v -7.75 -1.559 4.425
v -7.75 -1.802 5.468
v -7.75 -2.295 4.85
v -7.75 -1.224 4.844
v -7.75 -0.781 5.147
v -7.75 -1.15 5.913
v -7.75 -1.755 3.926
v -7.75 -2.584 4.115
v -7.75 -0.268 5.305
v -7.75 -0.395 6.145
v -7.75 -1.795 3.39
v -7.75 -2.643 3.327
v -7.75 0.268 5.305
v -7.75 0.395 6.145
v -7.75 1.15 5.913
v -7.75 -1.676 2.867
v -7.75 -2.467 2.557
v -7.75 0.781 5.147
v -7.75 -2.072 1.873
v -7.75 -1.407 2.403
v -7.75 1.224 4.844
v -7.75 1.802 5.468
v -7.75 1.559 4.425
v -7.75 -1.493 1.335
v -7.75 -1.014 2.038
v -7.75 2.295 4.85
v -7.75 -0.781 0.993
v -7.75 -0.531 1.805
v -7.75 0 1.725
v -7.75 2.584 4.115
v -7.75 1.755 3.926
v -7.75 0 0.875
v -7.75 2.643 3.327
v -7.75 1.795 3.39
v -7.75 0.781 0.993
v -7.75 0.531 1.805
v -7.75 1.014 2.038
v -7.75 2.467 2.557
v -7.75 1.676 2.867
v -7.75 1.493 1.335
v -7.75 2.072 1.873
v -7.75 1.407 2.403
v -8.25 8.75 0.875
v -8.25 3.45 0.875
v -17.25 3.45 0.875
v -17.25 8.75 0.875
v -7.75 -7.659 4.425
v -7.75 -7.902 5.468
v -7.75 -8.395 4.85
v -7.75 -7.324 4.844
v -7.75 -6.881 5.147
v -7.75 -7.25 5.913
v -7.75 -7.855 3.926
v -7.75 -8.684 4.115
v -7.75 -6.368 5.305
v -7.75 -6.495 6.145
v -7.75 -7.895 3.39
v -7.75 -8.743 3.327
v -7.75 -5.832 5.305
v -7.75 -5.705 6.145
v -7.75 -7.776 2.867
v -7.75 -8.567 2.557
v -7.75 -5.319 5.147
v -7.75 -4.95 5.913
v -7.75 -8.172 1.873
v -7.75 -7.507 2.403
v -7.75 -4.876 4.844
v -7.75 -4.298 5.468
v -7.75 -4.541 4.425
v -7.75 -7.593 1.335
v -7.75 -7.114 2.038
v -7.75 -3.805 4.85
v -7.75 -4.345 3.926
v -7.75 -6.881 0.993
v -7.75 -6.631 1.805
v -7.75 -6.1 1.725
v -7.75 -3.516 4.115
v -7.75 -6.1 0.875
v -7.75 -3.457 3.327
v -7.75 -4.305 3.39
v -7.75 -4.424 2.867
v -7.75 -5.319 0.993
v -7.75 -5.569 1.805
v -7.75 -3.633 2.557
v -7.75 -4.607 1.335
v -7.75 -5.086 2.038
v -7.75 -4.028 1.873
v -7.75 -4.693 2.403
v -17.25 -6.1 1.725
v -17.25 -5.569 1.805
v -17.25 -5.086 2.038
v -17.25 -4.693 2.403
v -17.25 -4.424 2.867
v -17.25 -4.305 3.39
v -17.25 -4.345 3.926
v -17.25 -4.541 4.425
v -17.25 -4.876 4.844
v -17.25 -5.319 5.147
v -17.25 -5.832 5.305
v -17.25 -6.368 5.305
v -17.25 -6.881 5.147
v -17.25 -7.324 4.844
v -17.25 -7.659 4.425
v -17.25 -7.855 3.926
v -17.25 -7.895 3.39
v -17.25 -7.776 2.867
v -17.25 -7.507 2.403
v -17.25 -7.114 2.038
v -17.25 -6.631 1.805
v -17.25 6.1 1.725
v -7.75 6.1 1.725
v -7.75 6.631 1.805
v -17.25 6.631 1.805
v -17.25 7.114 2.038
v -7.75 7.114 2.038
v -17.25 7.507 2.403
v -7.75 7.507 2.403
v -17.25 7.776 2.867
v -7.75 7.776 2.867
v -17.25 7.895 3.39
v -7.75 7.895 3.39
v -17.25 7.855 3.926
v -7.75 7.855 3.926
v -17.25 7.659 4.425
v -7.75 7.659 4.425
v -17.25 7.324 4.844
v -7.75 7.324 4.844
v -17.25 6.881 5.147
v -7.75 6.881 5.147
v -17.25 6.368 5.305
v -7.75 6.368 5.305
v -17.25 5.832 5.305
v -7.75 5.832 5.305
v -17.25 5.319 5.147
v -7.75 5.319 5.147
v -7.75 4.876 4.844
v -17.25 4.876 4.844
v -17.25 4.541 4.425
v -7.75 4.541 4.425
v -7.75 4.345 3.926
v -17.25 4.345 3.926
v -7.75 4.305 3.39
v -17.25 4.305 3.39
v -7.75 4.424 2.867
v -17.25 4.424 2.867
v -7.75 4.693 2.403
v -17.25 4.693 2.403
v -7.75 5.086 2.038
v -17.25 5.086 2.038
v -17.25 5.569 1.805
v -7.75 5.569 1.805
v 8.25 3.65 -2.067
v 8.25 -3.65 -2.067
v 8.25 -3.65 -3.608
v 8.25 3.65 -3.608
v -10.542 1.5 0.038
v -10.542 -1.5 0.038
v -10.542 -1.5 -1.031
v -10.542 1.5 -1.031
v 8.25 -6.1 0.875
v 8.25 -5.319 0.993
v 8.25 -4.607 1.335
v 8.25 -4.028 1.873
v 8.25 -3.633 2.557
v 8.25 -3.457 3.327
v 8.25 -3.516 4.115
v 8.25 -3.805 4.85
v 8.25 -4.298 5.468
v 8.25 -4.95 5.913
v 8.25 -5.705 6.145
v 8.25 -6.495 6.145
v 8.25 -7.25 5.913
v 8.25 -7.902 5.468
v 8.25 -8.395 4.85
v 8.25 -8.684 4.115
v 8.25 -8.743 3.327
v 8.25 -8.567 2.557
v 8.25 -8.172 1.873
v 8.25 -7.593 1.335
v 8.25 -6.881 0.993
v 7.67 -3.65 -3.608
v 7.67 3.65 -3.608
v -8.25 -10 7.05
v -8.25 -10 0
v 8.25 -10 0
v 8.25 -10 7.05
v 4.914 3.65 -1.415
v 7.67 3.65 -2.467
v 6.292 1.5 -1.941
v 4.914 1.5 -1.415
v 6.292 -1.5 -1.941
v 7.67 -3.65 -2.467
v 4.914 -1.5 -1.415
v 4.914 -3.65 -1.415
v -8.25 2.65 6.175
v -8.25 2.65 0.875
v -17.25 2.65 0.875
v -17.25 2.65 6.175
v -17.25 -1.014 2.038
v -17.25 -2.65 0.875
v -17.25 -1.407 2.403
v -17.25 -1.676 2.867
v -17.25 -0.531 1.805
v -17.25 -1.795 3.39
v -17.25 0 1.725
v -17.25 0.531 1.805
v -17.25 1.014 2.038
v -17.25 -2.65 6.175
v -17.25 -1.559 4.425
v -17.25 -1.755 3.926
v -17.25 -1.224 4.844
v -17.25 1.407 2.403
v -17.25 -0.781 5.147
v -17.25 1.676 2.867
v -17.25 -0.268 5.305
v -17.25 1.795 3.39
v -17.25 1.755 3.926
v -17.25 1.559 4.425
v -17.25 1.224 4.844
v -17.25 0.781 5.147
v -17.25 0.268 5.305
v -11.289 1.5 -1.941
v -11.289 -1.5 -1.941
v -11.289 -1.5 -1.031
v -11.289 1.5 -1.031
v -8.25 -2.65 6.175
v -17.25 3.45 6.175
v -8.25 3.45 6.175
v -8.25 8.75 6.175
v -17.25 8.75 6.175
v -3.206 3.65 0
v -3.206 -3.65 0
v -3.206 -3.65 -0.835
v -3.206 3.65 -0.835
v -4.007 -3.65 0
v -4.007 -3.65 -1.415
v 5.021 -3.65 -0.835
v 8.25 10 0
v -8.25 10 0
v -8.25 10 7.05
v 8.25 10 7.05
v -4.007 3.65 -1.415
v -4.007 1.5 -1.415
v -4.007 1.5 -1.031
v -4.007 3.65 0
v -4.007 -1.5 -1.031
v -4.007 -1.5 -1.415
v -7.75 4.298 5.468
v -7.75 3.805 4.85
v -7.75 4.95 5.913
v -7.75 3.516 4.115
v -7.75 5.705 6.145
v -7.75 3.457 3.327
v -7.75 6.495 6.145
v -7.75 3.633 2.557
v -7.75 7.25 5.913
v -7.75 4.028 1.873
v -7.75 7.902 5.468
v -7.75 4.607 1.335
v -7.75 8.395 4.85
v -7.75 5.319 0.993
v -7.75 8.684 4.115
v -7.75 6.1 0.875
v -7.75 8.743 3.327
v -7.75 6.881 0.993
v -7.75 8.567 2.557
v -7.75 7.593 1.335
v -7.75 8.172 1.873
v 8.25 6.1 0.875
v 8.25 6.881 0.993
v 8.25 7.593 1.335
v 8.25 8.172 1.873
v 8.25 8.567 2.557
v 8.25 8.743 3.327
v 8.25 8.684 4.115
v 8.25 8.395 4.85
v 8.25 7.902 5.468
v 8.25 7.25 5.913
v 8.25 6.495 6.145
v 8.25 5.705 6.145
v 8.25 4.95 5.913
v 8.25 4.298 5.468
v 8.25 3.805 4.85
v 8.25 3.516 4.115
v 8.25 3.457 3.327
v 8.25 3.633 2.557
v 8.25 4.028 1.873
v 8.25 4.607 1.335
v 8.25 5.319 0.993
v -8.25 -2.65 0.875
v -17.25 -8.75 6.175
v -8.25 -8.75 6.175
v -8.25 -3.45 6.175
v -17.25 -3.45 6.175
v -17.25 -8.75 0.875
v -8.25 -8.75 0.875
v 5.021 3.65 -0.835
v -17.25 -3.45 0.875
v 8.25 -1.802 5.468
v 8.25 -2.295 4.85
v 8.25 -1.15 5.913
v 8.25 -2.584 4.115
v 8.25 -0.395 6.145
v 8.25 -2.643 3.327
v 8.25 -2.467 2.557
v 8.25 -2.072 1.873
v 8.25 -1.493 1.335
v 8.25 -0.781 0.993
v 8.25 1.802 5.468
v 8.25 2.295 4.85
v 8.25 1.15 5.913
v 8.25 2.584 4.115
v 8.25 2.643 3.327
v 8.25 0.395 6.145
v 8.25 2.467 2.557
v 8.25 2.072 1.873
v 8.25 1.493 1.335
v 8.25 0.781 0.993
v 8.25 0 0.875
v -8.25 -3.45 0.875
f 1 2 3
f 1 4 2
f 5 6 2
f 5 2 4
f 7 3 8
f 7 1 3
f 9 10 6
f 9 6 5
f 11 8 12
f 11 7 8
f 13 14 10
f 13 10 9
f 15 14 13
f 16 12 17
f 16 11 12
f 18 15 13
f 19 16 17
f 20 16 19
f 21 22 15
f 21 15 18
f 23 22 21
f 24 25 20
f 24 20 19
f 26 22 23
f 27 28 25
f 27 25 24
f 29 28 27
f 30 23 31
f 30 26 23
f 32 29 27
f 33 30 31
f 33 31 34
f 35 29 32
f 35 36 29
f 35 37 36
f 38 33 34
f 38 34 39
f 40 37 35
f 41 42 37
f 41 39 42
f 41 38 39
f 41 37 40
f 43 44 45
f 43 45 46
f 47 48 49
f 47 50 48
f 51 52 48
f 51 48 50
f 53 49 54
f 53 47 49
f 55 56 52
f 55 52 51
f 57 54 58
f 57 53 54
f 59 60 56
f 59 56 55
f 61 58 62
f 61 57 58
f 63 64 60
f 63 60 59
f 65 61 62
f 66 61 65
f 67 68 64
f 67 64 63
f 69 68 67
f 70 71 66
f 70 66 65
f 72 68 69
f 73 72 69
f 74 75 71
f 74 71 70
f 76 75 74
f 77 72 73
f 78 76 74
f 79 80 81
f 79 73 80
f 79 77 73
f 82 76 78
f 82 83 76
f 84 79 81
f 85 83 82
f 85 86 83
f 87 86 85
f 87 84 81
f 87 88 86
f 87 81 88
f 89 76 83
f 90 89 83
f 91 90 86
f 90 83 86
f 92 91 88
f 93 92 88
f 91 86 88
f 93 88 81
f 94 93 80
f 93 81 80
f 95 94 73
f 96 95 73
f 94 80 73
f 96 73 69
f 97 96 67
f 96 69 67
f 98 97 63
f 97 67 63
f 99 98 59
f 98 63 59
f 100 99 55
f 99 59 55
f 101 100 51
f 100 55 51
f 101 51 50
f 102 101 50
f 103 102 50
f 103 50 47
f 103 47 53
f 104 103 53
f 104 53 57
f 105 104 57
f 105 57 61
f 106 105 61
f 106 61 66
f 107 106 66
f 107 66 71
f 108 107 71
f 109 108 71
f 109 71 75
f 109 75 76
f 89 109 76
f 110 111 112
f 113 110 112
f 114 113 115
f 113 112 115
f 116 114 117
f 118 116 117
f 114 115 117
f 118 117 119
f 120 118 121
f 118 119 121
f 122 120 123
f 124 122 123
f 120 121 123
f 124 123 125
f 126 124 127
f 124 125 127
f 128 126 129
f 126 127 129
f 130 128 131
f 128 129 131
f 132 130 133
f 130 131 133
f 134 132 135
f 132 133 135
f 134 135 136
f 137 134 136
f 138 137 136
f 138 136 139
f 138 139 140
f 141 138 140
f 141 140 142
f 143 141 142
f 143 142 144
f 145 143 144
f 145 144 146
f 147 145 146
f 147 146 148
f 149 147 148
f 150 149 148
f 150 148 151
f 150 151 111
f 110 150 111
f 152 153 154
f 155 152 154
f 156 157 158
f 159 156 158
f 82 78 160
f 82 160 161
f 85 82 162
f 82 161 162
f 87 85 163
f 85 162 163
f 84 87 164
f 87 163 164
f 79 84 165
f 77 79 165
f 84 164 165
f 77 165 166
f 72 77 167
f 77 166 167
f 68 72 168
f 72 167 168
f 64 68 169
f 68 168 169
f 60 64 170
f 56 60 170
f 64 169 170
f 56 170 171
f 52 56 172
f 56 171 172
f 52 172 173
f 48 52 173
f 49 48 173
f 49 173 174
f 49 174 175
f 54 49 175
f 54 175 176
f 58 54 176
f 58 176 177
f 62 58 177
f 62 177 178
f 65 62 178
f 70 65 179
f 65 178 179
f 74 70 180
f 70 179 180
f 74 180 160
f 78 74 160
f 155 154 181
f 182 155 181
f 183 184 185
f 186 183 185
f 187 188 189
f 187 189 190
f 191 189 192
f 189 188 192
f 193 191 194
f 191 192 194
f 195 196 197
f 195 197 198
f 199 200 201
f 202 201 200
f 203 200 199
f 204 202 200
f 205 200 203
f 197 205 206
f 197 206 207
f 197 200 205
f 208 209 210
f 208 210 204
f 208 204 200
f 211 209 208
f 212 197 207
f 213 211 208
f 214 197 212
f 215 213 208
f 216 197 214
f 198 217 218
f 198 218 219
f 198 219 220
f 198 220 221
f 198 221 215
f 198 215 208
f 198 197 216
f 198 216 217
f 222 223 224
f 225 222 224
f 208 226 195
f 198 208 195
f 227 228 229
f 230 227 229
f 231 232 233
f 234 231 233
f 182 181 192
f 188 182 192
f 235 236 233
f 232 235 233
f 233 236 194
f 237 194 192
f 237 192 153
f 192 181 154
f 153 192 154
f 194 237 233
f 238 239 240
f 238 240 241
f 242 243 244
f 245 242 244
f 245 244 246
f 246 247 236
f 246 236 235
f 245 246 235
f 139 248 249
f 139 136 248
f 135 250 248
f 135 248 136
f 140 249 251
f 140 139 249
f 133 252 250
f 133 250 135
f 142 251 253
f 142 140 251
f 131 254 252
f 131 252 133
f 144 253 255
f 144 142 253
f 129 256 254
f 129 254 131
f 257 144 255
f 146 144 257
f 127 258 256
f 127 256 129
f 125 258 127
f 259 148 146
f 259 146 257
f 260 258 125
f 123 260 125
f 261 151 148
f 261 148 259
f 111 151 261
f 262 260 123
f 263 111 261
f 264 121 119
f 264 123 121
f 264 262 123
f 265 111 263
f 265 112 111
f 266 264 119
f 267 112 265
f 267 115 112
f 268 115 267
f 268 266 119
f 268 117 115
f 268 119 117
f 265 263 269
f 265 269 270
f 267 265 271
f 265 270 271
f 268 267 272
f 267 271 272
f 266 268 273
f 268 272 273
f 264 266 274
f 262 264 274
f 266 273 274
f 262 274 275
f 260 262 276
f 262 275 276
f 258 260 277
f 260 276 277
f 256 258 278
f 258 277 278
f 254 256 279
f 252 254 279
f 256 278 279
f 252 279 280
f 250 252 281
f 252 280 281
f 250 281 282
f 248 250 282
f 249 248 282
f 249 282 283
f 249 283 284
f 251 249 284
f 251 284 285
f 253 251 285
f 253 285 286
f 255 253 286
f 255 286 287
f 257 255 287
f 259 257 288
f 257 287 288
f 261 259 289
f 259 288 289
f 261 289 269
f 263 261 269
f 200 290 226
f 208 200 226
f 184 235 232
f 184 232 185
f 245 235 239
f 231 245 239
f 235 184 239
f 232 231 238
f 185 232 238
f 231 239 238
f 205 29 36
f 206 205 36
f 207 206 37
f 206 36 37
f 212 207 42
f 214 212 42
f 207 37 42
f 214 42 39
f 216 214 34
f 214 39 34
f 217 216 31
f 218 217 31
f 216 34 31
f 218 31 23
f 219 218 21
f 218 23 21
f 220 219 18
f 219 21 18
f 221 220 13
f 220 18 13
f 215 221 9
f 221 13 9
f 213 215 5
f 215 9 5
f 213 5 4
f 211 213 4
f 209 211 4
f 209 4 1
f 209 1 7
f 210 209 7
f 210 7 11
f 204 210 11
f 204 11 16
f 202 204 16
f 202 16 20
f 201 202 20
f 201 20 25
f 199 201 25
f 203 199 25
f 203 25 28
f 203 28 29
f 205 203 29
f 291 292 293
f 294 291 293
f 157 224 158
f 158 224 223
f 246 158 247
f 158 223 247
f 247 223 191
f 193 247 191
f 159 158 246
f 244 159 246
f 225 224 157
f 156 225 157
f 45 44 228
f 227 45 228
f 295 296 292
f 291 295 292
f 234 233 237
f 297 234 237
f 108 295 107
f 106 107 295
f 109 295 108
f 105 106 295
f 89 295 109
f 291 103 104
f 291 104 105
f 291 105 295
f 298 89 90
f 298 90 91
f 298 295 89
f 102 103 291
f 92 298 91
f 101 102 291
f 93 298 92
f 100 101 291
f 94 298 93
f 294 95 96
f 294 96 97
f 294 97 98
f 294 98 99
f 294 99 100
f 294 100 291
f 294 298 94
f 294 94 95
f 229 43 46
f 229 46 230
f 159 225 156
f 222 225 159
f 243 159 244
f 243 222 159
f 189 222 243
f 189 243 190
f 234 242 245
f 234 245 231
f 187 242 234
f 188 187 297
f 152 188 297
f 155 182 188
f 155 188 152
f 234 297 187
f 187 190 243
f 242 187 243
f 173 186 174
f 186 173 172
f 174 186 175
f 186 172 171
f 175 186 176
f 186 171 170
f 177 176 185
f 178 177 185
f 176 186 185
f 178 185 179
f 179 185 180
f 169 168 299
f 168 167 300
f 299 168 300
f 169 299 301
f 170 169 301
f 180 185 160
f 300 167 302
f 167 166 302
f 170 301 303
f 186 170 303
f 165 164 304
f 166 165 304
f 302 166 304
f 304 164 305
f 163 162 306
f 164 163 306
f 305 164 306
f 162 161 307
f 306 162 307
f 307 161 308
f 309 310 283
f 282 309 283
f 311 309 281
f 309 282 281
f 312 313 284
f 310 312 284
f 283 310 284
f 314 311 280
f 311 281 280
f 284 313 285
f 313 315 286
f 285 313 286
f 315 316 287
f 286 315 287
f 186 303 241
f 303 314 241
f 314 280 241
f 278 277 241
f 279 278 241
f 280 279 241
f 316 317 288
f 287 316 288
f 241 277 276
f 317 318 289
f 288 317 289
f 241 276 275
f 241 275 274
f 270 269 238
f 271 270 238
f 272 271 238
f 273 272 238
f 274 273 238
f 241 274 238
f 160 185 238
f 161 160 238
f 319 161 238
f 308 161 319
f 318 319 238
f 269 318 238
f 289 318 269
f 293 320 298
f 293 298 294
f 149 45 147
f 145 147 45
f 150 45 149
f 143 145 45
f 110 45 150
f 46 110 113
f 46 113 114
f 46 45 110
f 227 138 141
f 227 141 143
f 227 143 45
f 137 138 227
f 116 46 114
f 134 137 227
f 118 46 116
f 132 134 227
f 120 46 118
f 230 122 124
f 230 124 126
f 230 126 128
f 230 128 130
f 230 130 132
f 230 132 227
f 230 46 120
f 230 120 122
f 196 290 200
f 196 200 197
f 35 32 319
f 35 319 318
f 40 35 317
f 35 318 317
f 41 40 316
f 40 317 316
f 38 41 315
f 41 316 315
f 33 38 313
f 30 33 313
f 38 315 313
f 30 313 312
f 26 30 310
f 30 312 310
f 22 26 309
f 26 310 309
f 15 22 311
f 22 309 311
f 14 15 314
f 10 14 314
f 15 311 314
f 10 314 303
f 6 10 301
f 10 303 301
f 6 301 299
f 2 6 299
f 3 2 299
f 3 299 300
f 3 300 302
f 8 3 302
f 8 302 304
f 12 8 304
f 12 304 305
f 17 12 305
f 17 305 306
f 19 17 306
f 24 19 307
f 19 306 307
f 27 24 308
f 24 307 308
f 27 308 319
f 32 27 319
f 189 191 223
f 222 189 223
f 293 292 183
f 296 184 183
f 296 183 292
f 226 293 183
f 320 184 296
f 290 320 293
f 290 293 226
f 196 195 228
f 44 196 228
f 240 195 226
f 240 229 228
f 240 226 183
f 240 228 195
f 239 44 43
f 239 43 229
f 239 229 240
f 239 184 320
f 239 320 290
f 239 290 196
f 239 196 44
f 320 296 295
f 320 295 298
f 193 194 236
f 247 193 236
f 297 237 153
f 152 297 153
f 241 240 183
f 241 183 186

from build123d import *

# Parameters (mm, degrees)
SKETCH_1_W           = 16.5
SKETCH_1_H           = 20
EXTRUDE_1_DEPTH      = 7.05
SKETCH_2_W           = 5.3
SKETCH_2_H           = 5.3
EXTRUDE_2_DEPTH      = 9
SKETCH_3_R           = 1.8
CUT_EXTRUDE_1_DEPTH  = 26
SKETCH_4_R           = 2.65
CUT_EXTRUDE_4_DEPTH  = 16
EXTRUDE_3_DEPTH      = 3.65
EXTRUDE_3_DEPTH_BACK = 3.65
EXTRUDE_4_DEPTH      = 1.5
EXTRUDE_4_DEPTH_BACK = 1.5


with BuildPart() as part:
    # 草图1 → 凸台-拉伸1 (new body)
    with BuildSketch(Plane.XY):
        Rectangle(SKETCH_1_W, SKETCH_1_H)
    extrude(amount=EXTRUDE_1_DEPTH)

    # 草图2 → 凸台-拉伸2 (add)
    with BuildSketch(Plane.ZY.offset(8.25)):
        with Locations((3.525, 6.1)):
            Rectangle(SKETCH_2_W, SKETCH_2_H)
        with Locations((3.525, 0)):
            Rectangle(SKETCH_2_W, SKETCH_2_H)
        with Locations((3.525, -6.1)):
            Rectangle(SKETCH_2_W, SKETCH_2_H)
    extrude(amount=EXTRUDE_2_DEPTH)

    # 草图3 → 切除-拉伸1 (cut)
    with BuildSketch(Plane(origin=(8.25, 0, 0), x_dir=(0, 0, -1), z_dir=(1, 0, 0))):
        with Locations((-3.525, 0)):
            Circle(SKETCH_3_R)
        with Locations((-3.525, 6.1)):
            Circle(SKETCH_3_R)
        with Locations((-3.525, -6.1)):
            Circle(SKETCH_3_R)
    extrude(amount=-CUT_EXTRUDE_1_DEPTH, mode=Mode.SUBTRACT)

    # 草图4 → 切除-拉伸4 (cut)
    with BuildSketch(Plane(origin=(8.25, 0, 0), x_dir=(0, 0, -1), z_dir=(1, 0, 0))):
        with Locations((-3.525, 0)):
            Circle(SKETCH_4_R)
        with Locations((-3.525, 6.1)):
            Circle(SKETCH_4_R)
        with Locations((-3.525, -6.1)):
            Circle(SKETCH_4_R)
    extrude(amount=-CUT_EXTRUDE_4_DEPTH, mode=Mode.SUBTRACT)

    # 草图6 → 凸台-拉伸3 (add, two sides: drawn at the far end of the back side and taken through both)
    with BuildSketch(Plane(origin=(0, 0, 0), x_dir=(1, 0, 0), z_dir=(0, 1, 0)).offset(-EXTRUDE_3_DEPTH_BACK)):
        Polygon((-3.205949892, 0.834716435), (5.020511508, 0.834716435), (8.25, 2.067145109), (8.25, 3.607680952), (7.67, 3.607680952), (7.67, 3.027680952), (7.67, 2.466605373), (4.91360258, 1.414716435), (-3.205949892, 1.414716435), (-4.00702853, 1.414716435), (-4.00702853, 0), (-3.205949892, 0), align=None)
    extrude(amount=EXTRUDE_3_DEPTH + EXTRUDE_3_DEPTH_BACK)

    # 草图7 → 凸台-拉伸4 (add, two sides: drawn at the far end of the back side and taken through both)
    with BuildSketch(Plane(origin=(0, 0, 0), x_dir=(1, 0, 0), z_dir=(0, 1, 0)).offset(-EXTRUDE_4_DEPTH_BACK)):
        Polygon((6.29180129, 1.940660904), (-11.289383921, 1.940660904), (-11.289383921, 1.03130852), (-10.541709173, -0.037580686), (-10.541709173, 1.03130852), (-4.00702853, 1.03130852), (-4.00702853, 1.414716435), (4.91360258, 1.414716435), align=None)
    extrude(amount=EXTRUDE_4_DEPTH + EXTRUDE_4_DEPTH_BACK)


solid = part.part
